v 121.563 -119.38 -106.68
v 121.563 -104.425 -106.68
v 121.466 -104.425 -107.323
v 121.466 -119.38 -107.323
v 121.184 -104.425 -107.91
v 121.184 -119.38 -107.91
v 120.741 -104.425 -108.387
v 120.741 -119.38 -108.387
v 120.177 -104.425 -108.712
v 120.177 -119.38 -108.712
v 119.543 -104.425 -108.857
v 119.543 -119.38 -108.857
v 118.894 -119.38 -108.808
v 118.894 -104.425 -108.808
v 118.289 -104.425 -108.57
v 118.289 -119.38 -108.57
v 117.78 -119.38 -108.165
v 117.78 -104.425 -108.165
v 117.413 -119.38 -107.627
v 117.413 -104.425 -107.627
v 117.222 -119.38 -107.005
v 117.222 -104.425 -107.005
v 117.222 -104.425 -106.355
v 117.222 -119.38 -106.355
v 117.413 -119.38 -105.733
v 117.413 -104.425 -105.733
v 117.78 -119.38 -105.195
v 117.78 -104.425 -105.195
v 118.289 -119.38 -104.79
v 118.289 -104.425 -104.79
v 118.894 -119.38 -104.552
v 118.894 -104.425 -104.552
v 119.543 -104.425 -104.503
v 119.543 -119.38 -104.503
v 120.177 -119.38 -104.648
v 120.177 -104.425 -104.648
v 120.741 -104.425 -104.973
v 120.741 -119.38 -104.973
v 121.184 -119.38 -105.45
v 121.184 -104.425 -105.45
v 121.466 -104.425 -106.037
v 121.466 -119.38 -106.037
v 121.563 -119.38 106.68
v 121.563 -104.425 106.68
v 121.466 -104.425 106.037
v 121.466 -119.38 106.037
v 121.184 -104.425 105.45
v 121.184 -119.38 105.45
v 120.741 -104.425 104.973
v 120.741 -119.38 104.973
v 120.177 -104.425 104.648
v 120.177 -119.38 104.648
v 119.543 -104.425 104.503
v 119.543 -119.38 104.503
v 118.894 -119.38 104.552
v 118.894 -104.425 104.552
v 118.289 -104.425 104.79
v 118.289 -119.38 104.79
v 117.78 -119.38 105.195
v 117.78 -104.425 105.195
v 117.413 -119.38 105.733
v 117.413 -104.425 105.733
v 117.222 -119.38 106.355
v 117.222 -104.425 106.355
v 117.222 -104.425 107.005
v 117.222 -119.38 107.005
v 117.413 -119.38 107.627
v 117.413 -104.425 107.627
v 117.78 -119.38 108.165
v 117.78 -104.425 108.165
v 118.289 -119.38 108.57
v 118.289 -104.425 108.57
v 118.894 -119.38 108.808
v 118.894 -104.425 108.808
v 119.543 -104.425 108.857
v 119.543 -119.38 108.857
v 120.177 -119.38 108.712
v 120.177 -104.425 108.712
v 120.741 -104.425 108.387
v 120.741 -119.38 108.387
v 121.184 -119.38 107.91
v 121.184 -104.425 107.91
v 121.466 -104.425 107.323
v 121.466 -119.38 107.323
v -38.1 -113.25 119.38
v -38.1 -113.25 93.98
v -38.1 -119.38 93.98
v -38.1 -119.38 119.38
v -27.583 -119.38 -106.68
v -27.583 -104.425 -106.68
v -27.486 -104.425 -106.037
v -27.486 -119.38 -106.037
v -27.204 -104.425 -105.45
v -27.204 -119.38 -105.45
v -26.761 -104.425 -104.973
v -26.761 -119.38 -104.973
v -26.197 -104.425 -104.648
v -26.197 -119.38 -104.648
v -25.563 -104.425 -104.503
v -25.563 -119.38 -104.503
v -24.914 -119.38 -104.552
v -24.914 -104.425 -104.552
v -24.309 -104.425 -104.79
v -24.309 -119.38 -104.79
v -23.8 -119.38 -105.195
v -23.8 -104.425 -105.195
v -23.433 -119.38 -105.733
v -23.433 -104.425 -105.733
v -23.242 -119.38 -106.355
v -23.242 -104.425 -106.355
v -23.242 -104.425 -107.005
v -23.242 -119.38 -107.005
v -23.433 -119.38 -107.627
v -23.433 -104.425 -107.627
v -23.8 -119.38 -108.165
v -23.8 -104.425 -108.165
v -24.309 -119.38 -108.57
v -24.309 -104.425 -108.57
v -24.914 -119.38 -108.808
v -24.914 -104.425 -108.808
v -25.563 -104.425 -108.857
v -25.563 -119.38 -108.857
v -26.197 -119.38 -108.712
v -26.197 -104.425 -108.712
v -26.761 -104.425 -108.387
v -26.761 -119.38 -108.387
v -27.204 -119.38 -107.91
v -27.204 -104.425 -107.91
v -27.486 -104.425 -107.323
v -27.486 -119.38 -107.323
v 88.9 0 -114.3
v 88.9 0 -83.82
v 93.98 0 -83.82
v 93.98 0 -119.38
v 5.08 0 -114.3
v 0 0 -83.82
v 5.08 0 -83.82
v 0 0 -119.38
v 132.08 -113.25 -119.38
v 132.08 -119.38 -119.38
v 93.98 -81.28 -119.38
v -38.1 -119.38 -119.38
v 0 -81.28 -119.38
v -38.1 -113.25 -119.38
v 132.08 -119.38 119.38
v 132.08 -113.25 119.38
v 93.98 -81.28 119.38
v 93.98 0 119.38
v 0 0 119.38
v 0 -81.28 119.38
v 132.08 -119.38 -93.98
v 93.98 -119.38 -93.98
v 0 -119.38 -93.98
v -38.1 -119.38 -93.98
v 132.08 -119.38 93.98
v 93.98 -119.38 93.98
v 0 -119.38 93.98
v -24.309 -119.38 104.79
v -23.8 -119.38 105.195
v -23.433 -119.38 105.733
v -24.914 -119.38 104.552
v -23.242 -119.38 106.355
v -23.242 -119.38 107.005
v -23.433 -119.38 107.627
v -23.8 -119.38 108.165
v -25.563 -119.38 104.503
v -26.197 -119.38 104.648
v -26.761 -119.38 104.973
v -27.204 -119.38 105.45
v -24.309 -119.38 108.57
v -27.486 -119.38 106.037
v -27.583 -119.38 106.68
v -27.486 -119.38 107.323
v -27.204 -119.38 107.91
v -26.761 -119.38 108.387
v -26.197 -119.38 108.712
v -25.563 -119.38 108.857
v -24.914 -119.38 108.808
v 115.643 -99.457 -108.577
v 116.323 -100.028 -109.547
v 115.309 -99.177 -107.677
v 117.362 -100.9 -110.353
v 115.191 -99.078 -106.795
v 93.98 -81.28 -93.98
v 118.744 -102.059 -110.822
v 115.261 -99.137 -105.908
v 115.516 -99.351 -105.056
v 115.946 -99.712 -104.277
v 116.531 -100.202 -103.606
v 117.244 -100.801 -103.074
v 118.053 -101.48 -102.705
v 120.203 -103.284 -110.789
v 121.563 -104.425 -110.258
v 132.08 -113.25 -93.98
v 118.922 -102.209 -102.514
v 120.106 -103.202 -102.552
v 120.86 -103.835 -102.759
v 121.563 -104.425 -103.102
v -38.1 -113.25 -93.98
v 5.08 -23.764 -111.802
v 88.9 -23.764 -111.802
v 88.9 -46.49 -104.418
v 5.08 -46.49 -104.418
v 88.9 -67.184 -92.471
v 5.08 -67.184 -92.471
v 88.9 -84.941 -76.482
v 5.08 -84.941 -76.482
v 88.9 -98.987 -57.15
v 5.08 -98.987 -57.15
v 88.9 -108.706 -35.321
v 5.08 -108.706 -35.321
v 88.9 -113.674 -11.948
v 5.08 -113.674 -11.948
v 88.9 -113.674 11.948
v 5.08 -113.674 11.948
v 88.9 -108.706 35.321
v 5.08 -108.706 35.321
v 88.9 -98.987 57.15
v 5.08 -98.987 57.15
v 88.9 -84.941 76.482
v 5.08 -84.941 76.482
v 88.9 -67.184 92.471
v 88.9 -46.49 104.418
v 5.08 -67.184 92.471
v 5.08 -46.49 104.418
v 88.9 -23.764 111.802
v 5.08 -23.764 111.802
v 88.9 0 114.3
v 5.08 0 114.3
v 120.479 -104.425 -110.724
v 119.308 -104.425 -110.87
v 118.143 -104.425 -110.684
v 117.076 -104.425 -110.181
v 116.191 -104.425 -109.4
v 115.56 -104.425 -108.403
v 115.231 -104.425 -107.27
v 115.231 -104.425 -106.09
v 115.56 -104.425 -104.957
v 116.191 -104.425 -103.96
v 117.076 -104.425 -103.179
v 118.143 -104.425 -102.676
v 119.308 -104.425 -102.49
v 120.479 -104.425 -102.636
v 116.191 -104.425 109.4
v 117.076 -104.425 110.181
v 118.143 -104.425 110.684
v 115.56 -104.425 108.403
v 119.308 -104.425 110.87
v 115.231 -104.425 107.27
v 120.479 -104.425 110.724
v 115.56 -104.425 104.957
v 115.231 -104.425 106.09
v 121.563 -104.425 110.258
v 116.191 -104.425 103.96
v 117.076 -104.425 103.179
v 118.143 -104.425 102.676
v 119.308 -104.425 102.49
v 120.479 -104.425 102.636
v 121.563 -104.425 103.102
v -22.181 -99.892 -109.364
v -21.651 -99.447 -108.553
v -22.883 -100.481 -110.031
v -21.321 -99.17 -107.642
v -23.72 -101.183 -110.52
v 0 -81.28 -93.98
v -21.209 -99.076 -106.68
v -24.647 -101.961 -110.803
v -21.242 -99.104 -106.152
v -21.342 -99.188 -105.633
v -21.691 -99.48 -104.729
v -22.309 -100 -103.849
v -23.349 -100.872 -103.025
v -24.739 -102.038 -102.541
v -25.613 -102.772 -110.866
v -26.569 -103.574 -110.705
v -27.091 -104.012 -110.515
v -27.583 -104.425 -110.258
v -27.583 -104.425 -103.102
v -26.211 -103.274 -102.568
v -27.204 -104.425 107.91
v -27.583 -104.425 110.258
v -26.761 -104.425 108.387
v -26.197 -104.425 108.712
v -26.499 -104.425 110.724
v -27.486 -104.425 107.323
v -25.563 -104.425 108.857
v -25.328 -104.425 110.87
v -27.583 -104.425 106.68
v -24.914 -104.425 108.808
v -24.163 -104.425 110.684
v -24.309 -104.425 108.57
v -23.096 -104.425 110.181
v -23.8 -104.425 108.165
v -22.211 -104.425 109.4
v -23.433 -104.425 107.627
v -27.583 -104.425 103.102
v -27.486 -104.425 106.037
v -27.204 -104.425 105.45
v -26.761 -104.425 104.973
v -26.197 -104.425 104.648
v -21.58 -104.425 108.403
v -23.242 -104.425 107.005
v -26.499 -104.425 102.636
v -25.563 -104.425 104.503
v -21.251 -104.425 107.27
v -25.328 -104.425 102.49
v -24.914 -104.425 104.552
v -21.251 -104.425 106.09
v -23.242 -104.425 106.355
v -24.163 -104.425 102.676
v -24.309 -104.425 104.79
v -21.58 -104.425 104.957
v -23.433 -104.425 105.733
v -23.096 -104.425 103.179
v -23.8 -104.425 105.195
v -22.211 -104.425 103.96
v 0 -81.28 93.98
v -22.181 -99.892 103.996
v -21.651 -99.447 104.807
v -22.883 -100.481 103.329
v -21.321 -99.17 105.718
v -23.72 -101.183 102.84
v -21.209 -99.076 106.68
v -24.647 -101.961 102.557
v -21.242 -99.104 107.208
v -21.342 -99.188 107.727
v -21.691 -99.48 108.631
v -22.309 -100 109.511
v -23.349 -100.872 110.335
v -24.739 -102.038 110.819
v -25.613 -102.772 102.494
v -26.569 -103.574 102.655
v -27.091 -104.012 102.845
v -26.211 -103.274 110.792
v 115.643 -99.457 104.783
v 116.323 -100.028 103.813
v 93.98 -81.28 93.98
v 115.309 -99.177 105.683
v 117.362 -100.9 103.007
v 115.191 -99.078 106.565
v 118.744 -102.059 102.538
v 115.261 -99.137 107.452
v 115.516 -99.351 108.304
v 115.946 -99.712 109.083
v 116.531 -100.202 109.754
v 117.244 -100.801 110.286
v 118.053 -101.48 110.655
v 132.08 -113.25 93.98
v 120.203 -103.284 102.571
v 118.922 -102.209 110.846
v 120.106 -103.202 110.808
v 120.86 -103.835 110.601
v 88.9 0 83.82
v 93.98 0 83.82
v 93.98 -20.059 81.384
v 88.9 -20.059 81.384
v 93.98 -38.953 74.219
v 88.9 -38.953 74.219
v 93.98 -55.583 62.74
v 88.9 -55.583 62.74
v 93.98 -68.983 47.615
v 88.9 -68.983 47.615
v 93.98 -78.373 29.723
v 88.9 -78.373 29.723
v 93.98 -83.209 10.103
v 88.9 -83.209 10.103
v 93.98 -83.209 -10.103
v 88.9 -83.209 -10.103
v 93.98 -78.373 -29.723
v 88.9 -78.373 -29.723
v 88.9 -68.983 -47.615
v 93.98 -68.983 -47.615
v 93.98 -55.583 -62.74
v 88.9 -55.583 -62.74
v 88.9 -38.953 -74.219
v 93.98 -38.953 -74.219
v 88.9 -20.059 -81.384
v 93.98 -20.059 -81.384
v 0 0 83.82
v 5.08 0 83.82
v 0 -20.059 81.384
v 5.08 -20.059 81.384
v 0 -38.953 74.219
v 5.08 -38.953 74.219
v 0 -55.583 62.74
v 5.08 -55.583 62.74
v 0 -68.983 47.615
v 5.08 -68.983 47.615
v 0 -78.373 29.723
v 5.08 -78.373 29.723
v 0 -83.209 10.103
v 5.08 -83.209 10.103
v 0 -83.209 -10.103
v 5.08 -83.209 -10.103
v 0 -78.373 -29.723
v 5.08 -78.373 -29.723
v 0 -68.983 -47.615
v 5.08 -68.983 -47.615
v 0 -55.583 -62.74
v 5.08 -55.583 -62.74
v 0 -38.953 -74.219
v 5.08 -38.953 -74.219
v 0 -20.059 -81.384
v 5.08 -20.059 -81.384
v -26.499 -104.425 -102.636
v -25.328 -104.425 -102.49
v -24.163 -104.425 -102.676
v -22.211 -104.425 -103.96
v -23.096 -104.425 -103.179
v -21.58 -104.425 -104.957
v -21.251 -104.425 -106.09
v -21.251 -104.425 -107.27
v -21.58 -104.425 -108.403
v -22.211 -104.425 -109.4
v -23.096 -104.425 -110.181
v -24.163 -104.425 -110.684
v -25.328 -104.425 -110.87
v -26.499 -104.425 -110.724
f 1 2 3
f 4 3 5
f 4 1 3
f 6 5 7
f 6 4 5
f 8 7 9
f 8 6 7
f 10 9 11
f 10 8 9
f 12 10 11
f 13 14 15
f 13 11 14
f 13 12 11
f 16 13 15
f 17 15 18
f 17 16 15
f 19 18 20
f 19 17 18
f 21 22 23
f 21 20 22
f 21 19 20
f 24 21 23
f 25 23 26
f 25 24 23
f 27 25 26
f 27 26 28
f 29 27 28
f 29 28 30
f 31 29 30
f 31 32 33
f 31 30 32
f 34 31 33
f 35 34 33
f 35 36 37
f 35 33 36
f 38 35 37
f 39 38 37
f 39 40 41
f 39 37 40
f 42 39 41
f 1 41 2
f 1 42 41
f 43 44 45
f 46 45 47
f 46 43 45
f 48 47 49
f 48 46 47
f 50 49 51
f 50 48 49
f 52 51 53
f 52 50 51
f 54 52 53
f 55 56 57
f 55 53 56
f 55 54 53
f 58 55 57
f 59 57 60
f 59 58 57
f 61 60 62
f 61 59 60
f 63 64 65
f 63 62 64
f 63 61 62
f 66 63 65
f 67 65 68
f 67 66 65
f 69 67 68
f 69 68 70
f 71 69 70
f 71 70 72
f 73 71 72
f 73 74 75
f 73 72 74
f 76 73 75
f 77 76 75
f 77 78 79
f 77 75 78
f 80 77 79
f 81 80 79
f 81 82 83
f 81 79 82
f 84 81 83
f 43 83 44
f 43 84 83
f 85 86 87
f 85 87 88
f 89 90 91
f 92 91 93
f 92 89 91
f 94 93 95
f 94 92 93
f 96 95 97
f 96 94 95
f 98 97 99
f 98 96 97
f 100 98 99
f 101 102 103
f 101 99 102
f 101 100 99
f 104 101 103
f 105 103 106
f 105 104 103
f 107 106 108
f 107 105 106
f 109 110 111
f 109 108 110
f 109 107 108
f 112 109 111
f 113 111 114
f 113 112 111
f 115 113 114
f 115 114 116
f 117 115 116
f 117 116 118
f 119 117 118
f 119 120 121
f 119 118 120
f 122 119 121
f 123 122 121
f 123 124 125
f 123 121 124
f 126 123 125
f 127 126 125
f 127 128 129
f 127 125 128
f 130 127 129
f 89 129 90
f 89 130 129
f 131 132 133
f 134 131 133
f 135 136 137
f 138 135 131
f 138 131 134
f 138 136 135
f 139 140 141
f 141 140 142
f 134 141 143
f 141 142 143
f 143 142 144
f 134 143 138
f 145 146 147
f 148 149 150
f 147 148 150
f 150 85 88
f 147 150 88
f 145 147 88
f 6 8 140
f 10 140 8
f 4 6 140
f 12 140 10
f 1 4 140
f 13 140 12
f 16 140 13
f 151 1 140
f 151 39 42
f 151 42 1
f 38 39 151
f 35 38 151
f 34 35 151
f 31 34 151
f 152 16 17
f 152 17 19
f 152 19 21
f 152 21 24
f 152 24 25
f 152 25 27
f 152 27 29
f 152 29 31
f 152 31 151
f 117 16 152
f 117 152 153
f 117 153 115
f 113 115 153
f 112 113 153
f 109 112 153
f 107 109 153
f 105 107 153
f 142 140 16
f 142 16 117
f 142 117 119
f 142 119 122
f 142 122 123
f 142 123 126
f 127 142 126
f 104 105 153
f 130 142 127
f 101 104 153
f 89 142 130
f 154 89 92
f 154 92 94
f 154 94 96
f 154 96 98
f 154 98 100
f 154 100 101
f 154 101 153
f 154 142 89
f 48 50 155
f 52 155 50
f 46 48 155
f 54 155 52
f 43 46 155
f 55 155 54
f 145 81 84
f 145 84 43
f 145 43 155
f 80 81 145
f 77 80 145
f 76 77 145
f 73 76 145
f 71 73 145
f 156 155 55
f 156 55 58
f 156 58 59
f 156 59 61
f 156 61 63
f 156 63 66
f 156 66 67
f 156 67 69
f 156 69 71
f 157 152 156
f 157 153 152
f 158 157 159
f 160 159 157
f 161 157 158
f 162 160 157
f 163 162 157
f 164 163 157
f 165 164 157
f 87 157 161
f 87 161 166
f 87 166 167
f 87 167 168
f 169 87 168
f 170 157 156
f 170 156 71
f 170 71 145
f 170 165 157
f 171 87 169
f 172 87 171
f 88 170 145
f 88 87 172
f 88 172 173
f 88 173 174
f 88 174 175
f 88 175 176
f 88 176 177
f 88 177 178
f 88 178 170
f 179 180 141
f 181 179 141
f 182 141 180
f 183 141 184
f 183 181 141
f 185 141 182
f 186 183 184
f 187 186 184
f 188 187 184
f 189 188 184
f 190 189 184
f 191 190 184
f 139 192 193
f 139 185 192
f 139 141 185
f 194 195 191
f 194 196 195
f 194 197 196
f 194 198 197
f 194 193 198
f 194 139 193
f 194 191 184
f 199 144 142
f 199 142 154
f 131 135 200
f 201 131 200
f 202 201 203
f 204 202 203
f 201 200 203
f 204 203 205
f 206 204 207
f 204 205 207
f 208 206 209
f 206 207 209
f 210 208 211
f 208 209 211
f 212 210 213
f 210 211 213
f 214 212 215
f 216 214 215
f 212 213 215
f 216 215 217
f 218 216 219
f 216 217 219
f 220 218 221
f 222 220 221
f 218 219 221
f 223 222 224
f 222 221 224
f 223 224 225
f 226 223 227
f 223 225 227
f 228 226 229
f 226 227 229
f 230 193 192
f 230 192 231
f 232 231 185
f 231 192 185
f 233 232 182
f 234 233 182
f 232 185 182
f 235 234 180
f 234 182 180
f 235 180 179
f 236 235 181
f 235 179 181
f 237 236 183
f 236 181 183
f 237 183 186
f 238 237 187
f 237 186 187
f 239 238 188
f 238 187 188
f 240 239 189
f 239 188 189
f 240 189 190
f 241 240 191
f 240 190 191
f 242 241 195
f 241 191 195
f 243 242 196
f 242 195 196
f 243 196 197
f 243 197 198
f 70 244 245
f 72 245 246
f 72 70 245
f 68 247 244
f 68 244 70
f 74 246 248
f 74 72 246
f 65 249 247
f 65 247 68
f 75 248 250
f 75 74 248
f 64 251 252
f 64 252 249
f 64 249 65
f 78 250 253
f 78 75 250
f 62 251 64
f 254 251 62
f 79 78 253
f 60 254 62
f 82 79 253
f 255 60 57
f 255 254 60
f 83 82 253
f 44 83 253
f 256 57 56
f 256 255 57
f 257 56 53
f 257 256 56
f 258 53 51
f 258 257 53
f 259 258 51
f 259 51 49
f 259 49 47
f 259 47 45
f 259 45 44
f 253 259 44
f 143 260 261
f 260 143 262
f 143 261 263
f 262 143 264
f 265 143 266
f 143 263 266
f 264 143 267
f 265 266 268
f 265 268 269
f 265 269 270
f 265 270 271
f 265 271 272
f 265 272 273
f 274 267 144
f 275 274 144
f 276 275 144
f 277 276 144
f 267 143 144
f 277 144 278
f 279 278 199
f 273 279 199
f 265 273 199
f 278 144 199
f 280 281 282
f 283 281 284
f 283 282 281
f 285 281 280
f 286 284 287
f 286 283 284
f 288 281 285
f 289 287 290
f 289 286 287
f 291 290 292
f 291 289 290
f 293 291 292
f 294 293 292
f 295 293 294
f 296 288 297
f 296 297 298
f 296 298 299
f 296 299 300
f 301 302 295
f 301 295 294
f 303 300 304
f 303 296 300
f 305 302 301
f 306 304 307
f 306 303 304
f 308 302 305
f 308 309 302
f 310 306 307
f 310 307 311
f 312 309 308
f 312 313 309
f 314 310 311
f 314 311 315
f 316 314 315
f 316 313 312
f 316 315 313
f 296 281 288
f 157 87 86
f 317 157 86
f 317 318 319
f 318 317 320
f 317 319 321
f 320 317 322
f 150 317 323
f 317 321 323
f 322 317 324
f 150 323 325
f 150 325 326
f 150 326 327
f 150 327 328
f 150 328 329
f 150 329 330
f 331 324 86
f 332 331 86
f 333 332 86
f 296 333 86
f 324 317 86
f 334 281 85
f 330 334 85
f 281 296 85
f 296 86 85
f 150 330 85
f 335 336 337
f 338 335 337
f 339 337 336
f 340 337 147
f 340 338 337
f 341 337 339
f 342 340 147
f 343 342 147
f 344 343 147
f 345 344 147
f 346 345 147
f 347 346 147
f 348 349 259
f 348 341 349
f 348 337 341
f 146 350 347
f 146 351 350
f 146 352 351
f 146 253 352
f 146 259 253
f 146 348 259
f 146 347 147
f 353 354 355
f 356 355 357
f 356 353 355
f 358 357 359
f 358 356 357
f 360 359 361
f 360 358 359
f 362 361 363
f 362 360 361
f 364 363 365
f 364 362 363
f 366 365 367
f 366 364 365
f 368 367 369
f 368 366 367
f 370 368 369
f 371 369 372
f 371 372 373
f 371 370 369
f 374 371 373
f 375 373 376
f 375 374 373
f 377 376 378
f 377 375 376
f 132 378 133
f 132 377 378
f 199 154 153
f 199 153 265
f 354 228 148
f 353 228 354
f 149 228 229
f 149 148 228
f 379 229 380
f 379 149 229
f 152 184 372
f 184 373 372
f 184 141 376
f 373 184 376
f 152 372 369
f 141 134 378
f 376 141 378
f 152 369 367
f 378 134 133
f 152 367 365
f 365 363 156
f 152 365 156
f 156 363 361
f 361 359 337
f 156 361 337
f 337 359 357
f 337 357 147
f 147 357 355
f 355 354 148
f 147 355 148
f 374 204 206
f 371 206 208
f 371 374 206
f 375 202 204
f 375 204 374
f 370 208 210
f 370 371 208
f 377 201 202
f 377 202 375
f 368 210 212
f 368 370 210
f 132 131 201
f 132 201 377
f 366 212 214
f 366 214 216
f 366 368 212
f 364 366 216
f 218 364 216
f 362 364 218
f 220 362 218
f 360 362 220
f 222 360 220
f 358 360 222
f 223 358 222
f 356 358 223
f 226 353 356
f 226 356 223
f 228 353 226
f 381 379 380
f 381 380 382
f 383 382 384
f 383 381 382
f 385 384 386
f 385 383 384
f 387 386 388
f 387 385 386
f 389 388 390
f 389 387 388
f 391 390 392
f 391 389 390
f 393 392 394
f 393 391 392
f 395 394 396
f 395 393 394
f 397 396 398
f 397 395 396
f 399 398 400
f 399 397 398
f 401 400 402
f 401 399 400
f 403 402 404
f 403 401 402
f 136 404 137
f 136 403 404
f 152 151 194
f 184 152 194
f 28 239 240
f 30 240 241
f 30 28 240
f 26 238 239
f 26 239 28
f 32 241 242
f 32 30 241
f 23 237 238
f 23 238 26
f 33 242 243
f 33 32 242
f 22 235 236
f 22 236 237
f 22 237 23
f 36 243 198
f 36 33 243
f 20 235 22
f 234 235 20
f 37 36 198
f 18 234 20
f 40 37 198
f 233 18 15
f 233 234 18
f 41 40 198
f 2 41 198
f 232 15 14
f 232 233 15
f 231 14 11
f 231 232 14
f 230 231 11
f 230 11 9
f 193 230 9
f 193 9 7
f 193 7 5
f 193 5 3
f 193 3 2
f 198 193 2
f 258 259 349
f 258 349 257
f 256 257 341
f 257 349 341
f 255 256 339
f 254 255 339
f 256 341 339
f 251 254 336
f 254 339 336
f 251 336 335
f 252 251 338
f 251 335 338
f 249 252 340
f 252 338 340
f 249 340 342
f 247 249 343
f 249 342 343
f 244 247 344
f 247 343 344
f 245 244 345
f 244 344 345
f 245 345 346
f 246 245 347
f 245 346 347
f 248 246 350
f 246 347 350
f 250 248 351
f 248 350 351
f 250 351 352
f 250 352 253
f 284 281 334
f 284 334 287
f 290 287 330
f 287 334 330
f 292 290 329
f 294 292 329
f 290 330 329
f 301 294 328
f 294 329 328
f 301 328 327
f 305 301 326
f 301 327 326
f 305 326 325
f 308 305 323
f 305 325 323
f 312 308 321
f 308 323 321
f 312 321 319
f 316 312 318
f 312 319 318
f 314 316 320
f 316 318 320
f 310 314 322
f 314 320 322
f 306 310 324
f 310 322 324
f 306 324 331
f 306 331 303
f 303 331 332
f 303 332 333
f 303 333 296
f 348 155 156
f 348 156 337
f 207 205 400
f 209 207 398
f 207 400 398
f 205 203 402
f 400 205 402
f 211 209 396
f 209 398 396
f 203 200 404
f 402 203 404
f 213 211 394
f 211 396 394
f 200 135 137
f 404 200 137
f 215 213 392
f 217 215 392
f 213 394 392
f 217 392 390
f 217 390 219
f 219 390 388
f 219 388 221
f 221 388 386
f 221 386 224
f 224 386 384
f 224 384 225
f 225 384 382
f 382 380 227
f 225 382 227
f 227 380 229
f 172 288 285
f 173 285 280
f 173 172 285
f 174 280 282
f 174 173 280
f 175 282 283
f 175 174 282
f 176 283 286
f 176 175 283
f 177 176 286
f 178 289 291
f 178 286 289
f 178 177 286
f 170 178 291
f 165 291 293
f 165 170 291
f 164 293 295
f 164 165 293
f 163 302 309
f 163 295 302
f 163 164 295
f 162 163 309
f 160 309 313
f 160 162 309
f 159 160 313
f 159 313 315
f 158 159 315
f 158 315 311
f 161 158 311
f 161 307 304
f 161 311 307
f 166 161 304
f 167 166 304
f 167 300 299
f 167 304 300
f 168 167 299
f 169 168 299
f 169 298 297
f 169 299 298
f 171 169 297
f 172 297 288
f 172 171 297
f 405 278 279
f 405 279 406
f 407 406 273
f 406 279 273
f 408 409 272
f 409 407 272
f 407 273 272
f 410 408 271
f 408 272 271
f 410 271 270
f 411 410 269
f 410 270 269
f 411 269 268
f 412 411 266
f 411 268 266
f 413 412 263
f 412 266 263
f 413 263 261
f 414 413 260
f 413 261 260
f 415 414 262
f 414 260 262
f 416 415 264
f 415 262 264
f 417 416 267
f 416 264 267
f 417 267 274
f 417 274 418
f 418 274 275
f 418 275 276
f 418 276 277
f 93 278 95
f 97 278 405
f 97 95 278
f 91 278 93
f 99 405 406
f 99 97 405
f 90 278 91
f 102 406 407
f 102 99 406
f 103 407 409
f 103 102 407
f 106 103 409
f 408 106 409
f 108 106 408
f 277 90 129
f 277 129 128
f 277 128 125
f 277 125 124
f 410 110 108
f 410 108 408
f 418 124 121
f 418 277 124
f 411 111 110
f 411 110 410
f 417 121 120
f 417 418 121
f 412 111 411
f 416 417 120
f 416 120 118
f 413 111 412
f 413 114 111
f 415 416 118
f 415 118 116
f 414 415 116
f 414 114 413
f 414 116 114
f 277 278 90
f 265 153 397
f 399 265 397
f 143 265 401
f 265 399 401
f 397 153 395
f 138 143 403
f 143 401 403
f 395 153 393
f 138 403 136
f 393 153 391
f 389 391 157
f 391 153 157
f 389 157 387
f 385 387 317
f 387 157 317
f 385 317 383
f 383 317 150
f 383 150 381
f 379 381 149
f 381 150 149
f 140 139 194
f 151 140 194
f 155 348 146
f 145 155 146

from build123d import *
from OCP.BRepFilletAPI import BRepFilletAPI_MakeChamfer

# Parameters (mm, degrees)
BOSS_EXTRUDE1_DEPTH        = 93.98
SHELL2_T                   = -5.08
BOSS_EXTRUDE2_DEPTH        = 93.98
SKETCH9_W                  = 31.75
SKETCH9_H                  = 12.7
BOSS_EXTRUDE3_DEPTH        = 25.4
SKETCH8_R                  = 2.1828125
CUT_EXTRUDE2_DEPTH         = 210.869181158
SKETCH10_W                 = 25.4
SKETCH10_H                 = 38.1
BOSS_EXTRUDE4_DEPTH        = 38.1
CHAMFER1_SIZE              = 38.1
CHAMFER1_SIZE_2            = 31.969695948
CHAMFER1_OF_MIRROR3_SIZE   = 38.1
CHAMFER1_OF_MIRROR3_SIZE_2 = 31.969695948
SKETCH13_R                 = 2.1828125
CUT_EXTRUDE4_DEPTH         = 230.473221096
SKETCH15_W                 = 93.98
SKETCH15_H                 = 25.4
CUT_EXTRUDE5_DEPTH         = 230.473221096
CUT_EXTRUDE6_START         = 40.355266
SKETCH14_R                 = 4.191
CUT_EXTRUDE6_DEPTH         = 25.4


with BuildPart() as part:
    # Sketch1 → Boss-Extrude1 (new body)
    with BuildSketch(Plane(origin=(0, 0, 0), x_dir=(0, 0, -1), z_dir=(1, 0, 0))):
        with BuildLine():
            Line((-119.38, 0), (-83.82, 0))
            ThreePointArc((-83.82, 0), (0, -83.82), (83.82, 0))
            Line((83.82, 0), (119.38, 0))
            ThreePointArc((119.38, 0), (0, -119.38), (-119.38, 0))
        make_face()
    extrude(amount=BOSS_EXTRUDE1_DEPTH)

    # Shell2
    shell2_openings = [part.faces().sort_by_distance(p)[0] for p in [
        (46.99, 0, 101.6),
        (46.99, -83.82, 0),
        (46.99, 0, -101.6),
    ]]
    offset(amount=SHELL2_T, openings=shell2_openings, kind=Kind.INTERSECTION)

    # Sketch6 → Boss-Extrude2 (add)
    with BuildSketch(Plane(origin=(0, 0, 0), x_dir=(0, 0, -1), z_dir=(1, 0, 0))):
        with BuildLine():
            Line((-119.38, 0), (-119.38, -119.38))
            Line((-119.38, -119.38), (0, -119.38))
            ThreePointArc((0, -119.38), (-84.414407538, -84.414407538), (-119.38, 0))
        make_face()
    boss_extrude2 = extrude(amount=BOSS_EXTRUDE2_DEPTH)

    # Sketch9 → Boss-Extrude3 (add)
    with BuildSketch(Plane.XY.offset(119.38)):
        with Locations((15.875, -113.03)):
            Rectangle(SKETCH9_W, SKETCH9_H)
        with Locations((78.105, -113.03)):
            Rectangle(SKETCH9_W, SKETCH9_H)
    boss_extrude3 = extrude(amount=BOSS_EXTRUDE3_DEPTH)

    # Sketch8 → Cut-Extrude2 (cut, through all)
    with BuildSketch(Plane(origin=(0, 0, 0), x_dir=(1, 0, 0), z_dir=(0, 1, 0))):
        with Locations(Location((15.875, -132.08, 0), (0, 0, 270))):
            Circle(SKETCH8_R)
        with Locations(Location((78.74, -132.08, 0), (0, 0, 270))):
            Circle(SKETCH8_R)
    cut_extrude2 = extrude(amount=-CUT_EXTRUDE2_DEPTH, mode=Mode.SUBTRACT)

    # Mirror2: Boss-Extrude2, Boss-Extrude3, Cut-Extrude2 across plane
    add(boss_extrude2.mirror(Plane.XY))
    add(boss_extrude3.mirror(Plane.XY))
    add(cut_extrude2.mirror(Plane.XY), mode=Mode.SUBTRACT)

    # Sketch10 → Boss-Extrude4 (add)
    with BuildSketch(Plane.ZY):
        with Locations((-106.68, -100.33)):
            Rectangle(SKETCH10_W, SKETCH10_H)
        with Locations((106.68, -100.33)):
            Rectangle(SKETCH10_W, SKETCH10_H)
    boss_extrude4 = extrude(amount=BOSS_EXTRUDE4_DEPTH)

    # Chamfer1
    chamfer1_edges_1 = [part.edges().sort_by_distance(p)[0] for p in [
        (-38.1, -81.28, 106.68),
    ]]
    chamfer1_side_1 = [part.faces().sort_by_distance(p)[0] for p in [
        (-37.460606081, -81.28, 106.68),
    ]]
    chamfer1_edges_2 = [part.edges().sort_by_distance(p)[0] for p in [
        (-38.1, -81.28, -106.68),
    ]]
    chamfer1_side_2 = [part.faces().sort_by_distance(p)[0] for p in [
        (-37.460606081, -81.28, -106.68),
    ]]
    chamfer1 = BRepFilletAPI_MakeChamfer(part.part.solid().wrapped)
    for e in chamfer1_edges_1:
        chamfer1.Add(CHAMFER1_SIZE - 0.0001, CHAMFER1_SIZE_2 - 0.0001, e.wrapped, chamfer1_side_1[0].wrapped)
    for e in chamfer1_edges_2:
        chamfer1.Add(CHAMFER1_SIZE - 0.0001, CHAMFER1_SIZE_2 - 0.0001, e.wrapped, chamfer1_side_2[0].wrapped)
    add(Compound.cast(chamfer1.Shape()), mode=Mode.REPLACE)  # a hair under: the kernel refuses the full size

    # Mirror3: Boss-Extrude4 across plane
    add(boss_extrude4.mirror(Plane(origin=(46.99, 0, 0), x_dir=(0, 0, 1), z_dir=(1, 0, 0))))

    # Chamfer1 of Mirror3
    chamfer1_of_mirror3_edges_1 = [part.edges().sort_by_distance(p)[0] for p in [
        (132.08, -81.28, 106.68),
    ]]
    chamfer1_of_mirror3_side_1 = [part.faces().sort_by_distance(p)[0] for p in [
        (131.440606081, -81.28, 106.68),
    ]]
    chamfer1_of_mirror3_edges_2 = [part.edges().sort_by_distance(p)[0] for p in [
        (132.08, -81.28, -106.68),
    ]]
    chamfer1_of_mirror3_side_2 = [part.faces().sort_by_distance(p)[0] for p in [
        (131.440606081, -81.28, -106.68),
    ]]
    chamfer1_of_mirror3 = BRepFilletAPI_MakeChamfer(part.part.solid().wrapped)
    for e in chamfer1_of_mirror3_edges_1:
        chamfer1_of_mirror3.Add(CHAMFER1_OF_MIRROR3_SIZE - 0.0001, CHAMFER1_OF_MIRROR3_SIZE_2 - 0.0001, e.wrapped, chamfer1_of_mirror3_side_1[0].wrapped)
    for e in chamfer1_of_mirror3_edges_2:
        chamfer1_of_mirror3.Add(CHAMFER1_OF_MIRROR3_SIZE - 0.0001, CHAMFER1_OF_MIRROR3_SIZE_2 - 0.0001, e.wrapped, chamfer1_of_mirror3_side_2[0].wrapped)
    add(Compound.cast(chamfer1_of_mirror3.Shape()), mode=Mode.REPLACE)  # a hair under: the kernel refuses the full size

    # Sketch13 → Cut-Extrude4 (cut, through all)
    with BuildSketch(Plane(origin=(0, -119.38, 0), x_dir=(1, 0, 0), z_dir=(0, 1, 0))):
        with Locations(Location((-25.4, -106.68, 0), (0, 0, 180))):
            Circle(SKETCH13_R)
        with Locations((119.38, -106.68)):
            Circle(SKETCH13_R)
        with Locations((119.38, 106.68)):
            Circle(SKETCH13_R)
        with Locations(Location((-25.4, 106.68, 0), (0, 0, 180))):
            Circle(SKETCH13_R)
    extrude(amount=CUT_EXTRUDE4_DEPTH, mode=Mode.SUBTRACT)

    # Sketch15 → Cut-Extrude5 (cut, through all)
    with BuildSketch(Plane(origin=(0, -119.38, 0), x_dir=(1, 0, 0), z_dir=(0, 1, 0))):
        with Locations((46.99, -132.08)):
            Rectangle(SKETCH15_W, SKETCH15_H)
        with Locations((46.99, 132.08)):
            Rectangle(SKETCH15_W, SKETCH15_H)
    extrude(amount=CUT_EXTRUDE5_DEPTH, mode=Mode.SUBTRACT)

    # Sketch14 → Cut-Extrude6 (cut)
    with BuildSketch(Plane(origin=(0, -119.38, 0), x_dir=(1, 0, 0), z_dir=(0, 1, 0)).offset(CUT_EXTRUDE6_START)):
        with Locations((-25.4, -106.68)):
            Circle(SKETCH14_R)
        with Locations((119.38, -106.68)):
            Circle(SKETCH14_R)
        with Locations((119.38, 106.68)):
            Circle(SKETCH14_R)
        with Locations((-25.4, 106.68)):
            Circle(SKETCH14_R)
    extrude(amount=-CUT_EXTRUDE6_DEPTH, mode=Mode.SUBTRACT)


solid = part.part
